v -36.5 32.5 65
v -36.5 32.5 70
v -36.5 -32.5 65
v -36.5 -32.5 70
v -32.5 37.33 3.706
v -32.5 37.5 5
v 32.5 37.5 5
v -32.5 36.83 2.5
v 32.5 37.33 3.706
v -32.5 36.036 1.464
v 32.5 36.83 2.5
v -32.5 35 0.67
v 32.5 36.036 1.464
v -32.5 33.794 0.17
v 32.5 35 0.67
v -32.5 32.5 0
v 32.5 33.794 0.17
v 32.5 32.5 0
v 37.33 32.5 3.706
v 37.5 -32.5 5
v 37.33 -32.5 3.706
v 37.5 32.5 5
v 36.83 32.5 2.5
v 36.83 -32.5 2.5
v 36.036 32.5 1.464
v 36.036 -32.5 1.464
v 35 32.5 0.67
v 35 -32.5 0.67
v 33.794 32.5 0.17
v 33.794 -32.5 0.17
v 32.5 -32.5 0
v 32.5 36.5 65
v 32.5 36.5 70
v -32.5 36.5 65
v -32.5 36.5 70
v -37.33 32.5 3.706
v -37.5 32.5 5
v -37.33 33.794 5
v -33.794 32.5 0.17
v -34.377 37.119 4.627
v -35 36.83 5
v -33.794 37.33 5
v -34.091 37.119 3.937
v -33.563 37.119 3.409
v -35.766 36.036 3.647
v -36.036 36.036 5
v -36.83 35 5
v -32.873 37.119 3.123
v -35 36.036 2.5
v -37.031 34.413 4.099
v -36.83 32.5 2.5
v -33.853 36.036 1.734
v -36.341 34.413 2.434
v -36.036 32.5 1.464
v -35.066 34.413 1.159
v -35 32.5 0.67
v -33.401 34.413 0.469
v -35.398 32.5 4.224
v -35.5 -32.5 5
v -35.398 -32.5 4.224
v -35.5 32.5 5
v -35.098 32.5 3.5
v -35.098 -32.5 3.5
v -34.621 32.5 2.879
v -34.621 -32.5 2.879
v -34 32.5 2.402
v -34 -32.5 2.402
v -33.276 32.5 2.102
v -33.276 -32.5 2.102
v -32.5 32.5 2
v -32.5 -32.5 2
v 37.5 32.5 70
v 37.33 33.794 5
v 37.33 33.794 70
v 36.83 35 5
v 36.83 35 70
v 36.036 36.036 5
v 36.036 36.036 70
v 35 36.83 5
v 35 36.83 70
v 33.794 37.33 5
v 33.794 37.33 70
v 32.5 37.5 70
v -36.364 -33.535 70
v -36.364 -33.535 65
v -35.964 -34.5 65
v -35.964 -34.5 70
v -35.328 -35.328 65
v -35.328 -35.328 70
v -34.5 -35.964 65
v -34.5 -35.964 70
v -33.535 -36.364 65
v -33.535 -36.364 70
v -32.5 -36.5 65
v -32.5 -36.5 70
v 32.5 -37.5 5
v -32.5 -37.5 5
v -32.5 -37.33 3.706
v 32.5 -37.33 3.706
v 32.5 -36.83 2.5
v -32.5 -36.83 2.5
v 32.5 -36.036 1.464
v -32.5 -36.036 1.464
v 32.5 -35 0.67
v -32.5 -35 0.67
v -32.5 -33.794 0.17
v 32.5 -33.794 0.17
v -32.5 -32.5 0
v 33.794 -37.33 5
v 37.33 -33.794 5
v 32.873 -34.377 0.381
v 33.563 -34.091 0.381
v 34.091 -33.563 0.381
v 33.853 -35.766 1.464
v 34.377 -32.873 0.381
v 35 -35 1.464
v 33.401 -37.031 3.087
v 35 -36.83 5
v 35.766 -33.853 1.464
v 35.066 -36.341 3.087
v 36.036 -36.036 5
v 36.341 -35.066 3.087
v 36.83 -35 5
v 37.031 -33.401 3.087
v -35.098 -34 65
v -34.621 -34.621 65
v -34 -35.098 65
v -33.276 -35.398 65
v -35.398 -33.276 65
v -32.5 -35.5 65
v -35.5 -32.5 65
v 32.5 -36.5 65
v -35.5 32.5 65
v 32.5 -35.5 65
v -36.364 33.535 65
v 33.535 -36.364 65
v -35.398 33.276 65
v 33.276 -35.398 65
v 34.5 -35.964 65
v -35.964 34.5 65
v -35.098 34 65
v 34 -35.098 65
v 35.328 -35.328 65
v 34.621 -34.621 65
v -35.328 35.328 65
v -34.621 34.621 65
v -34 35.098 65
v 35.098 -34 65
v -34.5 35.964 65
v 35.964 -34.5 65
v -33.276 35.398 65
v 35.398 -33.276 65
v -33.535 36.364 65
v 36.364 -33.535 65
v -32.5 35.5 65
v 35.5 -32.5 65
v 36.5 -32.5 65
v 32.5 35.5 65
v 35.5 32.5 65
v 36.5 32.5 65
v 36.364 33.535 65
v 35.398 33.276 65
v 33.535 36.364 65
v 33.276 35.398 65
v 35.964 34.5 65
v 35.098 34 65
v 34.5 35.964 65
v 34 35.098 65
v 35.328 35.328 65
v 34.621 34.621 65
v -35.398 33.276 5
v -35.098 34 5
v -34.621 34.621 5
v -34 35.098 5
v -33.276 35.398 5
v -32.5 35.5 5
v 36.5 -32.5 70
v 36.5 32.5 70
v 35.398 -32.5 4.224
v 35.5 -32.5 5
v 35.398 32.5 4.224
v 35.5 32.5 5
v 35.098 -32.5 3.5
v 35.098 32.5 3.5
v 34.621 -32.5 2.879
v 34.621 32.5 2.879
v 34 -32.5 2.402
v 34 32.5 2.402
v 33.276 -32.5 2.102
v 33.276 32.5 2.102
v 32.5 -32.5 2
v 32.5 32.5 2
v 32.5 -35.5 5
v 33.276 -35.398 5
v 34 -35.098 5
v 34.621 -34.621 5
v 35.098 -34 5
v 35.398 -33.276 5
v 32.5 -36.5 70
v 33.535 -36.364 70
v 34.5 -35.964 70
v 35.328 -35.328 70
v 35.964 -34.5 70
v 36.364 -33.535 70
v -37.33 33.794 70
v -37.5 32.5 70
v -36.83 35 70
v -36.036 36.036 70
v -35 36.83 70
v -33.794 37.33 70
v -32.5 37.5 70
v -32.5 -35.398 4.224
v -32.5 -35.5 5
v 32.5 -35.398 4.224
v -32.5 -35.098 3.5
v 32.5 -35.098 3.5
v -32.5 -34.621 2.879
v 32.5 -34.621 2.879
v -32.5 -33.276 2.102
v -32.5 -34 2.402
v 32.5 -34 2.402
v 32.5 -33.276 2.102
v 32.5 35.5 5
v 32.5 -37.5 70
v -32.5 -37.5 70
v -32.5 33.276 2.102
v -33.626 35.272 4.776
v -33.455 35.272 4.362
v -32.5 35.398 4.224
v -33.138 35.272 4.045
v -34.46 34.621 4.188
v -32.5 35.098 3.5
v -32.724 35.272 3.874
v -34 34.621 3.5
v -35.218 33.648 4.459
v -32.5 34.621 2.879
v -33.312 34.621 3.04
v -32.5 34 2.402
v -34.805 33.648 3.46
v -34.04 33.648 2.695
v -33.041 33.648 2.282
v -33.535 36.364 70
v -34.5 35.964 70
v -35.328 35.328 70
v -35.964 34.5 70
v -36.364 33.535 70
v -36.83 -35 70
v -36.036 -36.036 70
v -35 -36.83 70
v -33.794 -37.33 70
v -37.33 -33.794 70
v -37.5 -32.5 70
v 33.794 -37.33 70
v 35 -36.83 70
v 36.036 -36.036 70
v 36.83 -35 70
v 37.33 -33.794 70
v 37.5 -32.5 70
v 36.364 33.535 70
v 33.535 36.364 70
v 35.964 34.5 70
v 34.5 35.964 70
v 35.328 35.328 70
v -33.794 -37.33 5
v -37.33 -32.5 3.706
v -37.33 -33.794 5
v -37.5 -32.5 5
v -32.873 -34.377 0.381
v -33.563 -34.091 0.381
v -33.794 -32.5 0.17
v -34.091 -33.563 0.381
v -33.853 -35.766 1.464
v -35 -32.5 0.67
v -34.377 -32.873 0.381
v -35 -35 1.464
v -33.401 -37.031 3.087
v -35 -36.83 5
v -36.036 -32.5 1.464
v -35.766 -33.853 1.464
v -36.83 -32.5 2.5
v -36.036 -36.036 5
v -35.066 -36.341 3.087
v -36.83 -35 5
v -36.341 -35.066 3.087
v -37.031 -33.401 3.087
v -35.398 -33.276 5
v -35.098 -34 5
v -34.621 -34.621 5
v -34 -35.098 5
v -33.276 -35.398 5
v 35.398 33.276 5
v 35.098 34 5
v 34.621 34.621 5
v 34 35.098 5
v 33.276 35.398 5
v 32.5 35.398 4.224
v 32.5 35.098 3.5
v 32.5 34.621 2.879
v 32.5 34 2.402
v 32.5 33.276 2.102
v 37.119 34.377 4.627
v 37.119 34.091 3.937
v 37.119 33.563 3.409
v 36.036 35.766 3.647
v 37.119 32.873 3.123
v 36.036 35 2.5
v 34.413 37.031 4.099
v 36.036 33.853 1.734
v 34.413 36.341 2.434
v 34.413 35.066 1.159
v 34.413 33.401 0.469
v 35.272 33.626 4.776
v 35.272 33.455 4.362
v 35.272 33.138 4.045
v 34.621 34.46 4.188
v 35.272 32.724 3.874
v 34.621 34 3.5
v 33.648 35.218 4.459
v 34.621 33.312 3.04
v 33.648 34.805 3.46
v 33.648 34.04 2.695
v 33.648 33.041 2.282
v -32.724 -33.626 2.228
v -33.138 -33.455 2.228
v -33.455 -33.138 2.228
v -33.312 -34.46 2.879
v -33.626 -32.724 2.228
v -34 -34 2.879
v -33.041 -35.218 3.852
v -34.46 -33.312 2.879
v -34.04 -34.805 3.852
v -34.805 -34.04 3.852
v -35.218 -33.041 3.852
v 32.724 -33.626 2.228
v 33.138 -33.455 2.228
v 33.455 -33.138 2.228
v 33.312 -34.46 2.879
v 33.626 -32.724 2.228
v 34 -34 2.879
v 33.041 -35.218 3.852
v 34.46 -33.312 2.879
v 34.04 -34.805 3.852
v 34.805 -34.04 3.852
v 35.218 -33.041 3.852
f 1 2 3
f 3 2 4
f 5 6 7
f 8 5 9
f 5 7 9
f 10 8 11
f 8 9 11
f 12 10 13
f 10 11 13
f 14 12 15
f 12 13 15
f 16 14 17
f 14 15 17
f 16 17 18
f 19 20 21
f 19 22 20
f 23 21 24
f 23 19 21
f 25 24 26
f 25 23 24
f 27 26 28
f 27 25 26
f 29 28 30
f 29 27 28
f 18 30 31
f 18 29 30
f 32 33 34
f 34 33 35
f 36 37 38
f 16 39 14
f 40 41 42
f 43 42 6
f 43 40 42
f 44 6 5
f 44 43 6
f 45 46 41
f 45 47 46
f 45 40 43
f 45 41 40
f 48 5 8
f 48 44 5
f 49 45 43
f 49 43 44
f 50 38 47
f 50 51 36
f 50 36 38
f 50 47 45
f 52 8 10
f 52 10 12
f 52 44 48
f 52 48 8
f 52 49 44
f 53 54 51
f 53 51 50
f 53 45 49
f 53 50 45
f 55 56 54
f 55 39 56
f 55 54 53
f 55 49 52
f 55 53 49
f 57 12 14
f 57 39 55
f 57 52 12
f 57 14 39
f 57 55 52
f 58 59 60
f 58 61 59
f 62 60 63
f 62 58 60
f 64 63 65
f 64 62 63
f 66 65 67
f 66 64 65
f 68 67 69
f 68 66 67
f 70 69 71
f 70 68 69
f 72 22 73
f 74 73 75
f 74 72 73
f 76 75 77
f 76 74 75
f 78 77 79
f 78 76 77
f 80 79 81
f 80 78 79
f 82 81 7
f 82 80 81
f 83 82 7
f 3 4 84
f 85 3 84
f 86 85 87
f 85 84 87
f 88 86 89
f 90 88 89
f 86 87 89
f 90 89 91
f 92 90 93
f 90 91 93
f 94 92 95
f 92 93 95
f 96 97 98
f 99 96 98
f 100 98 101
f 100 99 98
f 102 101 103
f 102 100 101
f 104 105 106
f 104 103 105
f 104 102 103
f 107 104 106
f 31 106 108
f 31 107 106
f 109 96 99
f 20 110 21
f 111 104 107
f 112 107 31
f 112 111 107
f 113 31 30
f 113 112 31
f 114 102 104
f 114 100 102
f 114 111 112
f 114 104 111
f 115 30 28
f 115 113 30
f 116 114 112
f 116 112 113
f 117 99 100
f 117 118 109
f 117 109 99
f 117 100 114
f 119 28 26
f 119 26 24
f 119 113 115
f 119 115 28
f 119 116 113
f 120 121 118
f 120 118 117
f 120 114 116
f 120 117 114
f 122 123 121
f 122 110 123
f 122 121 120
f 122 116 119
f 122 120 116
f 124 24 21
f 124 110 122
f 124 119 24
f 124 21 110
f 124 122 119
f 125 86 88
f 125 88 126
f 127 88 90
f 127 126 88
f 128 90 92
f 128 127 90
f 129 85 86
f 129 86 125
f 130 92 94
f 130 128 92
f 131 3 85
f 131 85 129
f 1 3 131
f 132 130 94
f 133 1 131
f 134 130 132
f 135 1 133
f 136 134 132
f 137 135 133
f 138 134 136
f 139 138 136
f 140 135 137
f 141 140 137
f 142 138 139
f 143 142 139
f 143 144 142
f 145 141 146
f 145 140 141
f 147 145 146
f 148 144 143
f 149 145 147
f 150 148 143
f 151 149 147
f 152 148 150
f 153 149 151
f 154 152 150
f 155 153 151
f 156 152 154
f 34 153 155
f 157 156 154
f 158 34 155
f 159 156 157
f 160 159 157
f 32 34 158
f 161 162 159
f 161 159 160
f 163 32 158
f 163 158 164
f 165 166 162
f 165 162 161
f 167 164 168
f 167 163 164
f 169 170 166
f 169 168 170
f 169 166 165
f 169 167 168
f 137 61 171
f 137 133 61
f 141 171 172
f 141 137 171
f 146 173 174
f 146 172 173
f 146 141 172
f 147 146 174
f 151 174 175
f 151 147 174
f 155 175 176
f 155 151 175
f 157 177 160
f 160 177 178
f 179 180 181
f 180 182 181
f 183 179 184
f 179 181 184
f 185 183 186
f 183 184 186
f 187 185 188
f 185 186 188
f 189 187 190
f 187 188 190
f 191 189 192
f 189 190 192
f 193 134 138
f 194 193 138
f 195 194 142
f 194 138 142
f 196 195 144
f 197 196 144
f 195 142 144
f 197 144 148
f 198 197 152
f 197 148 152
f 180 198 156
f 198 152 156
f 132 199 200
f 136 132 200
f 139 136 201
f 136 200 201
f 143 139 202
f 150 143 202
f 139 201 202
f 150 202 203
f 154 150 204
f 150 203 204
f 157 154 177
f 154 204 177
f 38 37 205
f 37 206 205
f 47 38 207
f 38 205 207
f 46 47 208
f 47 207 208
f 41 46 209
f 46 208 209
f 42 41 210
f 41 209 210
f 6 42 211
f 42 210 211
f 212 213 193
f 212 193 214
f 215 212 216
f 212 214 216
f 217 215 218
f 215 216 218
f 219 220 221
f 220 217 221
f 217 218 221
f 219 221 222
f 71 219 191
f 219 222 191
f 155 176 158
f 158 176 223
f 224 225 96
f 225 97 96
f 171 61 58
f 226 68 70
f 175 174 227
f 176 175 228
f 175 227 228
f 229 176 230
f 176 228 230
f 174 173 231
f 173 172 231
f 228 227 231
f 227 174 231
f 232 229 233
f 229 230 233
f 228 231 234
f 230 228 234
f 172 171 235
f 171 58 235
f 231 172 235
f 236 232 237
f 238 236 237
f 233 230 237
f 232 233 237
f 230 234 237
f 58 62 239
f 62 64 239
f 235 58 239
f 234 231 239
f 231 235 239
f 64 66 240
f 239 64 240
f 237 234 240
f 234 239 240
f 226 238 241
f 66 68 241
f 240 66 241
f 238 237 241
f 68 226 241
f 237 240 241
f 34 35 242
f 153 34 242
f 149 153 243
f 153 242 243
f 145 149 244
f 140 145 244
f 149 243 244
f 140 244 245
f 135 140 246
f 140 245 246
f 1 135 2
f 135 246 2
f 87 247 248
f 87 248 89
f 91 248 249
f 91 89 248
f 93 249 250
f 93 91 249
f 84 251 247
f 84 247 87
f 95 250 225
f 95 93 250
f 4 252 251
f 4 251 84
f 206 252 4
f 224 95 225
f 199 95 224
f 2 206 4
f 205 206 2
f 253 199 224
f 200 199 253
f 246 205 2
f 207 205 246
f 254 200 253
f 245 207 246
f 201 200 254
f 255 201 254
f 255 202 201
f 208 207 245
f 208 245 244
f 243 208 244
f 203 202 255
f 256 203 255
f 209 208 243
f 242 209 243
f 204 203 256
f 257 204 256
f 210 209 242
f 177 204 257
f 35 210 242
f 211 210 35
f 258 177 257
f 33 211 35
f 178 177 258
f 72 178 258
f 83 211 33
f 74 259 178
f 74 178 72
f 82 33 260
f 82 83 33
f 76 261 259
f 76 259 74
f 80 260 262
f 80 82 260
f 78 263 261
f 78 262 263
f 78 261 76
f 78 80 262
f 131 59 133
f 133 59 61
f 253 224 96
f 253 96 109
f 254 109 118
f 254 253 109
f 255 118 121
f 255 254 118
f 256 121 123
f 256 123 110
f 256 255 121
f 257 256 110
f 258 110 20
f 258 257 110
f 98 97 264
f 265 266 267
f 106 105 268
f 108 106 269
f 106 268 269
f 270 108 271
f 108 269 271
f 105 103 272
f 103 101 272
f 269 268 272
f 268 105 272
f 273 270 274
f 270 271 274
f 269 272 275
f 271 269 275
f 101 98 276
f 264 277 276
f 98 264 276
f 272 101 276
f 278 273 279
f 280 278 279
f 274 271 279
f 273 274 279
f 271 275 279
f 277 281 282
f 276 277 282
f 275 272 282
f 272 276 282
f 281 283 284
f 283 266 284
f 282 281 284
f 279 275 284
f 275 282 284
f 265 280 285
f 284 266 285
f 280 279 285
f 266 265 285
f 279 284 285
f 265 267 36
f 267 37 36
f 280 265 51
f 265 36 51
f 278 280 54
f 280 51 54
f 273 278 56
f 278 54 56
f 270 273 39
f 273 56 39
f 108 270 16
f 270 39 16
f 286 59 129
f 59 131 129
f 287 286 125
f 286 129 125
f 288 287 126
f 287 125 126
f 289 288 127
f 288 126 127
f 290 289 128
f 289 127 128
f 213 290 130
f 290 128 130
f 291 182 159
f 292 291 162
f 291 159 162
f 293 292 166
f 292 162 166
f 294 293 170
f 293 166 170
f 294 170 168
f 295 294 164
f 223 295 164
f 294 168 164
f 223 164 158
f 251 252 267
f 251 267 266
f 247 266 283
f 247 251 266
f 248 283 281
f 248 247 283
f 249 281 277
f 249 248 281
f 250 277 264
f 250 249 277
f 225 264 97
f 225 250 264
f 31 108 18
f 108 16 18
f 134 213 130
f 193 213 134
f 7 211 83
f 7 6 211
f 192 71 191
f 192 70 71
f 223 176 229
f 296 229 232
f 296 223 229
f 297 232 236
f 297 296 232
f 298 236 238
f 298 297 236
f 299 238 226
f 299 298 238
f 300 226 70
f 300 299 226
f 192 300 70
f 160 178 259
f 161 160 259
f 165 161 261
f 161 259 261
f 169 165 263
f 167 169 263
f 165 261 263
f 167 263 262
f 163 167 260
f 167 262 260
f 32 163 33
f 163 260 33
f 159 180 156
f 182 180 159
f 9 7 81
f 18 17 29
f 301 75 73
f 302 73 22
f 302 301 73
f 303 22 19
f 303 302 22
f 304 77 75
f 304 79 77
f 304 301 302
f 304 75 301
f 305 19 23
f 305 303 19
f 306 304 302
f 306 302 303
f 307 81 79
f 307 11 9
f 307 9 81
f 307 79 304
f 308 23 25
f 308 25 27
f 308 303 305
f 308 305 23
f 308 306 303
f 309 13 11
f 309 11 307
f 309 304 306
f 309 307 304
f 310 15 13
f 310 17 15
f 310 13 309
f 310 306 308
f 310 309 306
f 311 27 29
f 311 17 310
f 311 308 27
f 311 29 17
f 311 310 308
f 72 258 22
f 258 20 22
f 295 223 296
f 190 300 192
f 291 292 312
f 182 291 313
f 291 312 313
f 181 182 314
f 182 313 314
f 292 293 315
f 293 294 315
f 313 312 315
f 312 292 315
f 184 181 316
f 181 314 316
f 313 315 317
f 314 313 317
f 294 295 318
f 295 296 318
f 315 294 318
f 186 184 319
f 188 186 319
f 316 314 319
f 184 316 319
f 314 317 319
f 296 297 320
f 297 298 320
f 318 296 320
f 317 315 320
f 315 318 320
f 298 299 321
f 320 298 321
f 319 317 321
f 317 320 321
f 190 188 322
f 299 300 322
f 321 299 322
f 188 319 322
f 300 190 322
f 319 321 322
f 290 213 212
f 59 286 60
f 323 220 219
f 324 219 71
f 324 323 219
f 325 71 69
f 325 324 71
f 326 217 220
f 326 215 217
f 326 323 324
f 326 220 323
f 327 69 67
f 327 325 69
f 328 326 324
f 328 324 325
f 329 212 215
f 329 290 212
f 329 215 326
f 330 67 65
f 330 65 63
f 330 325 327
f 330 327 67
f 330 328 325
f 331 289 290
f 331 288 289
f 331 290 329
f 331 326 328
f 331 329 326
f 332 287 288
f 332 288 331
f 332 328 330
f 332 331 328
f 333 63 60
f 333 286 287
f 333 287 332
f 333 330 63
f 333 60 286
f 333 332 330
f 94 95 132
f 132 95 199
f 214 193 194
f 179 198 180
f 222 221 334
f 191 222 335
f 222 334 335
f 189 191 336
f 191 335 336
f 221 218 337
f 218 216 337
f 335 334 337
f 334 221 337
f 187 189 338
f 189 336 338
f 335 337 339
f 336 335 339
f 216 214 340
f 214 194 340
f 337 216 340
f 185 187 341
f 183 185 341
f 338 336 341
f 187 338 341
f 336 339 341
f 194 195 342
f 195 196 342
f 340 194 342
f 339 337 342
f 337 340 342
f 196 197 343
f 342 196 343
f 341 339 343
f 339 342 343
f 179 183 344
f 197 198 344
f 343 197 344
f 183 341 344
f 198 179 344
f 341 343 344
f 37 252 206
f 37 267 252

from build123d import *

# Parameters (mm, degrees)
F0_W     = 75
F0_H     = 75
F0_W_2   = 71
F0_H_2   = 71
F1_DEPTH = 70
F2_R     = 5
F3_T     = -2
F6_DEPTH = 5


with BuildPart() as f1:
    # F0 (on Top) → F1 (new body)
    with BuildSketch(Plane.XY):
        Rectangle(F0_W, F0_H)
        Rectangle(F0_W_2, F0_H_2, mode=Mode.SUBTRACT)
        Rectangle(F0_W_2, F0_H_2)
    extrude(amount=F1_DEPTH)

    # F2
    f2_edges = [f1.edges().sort_by_distance(p)[0] for p in [
        (-37.5, -37.5, 35),
        (37.5, -37.5, 35),
        (0, -37.5, 0),
        (-37.5, 0, 0),
        (-37.5, 37.5, 35),
        (0, 37.5, 0),
        (37.5, 37.5, 35),
        (37.5, 0, 0),
    ]]
    fillet(f2_edges, radius=F2_R)

    # F3
    f3_openings = [f1.faces().sort_by_distance(p)[0] for p in [
        (0, 0, 70),
    ]]
    offset(amount=F3_T, openings=f3_openings)

    # F5 (on offset) → F6 (cut)
    with BuildSketch(Plane.XY.offset(70)):
        with BuildLine():
            Line((-36.5, 32.5), (-36.5, -32.5))
            ThreePointArc((-36.5, -32.5), (-35.3284271247, -35.3284271247), (-32.5, -36.5))
            Line((-32.5, -36.5), (32.5, -36.5))
            ThreePointArc((32.5, -36.5), (35.3284271247, -35.3284271247), (36.5, -32.5))
            Line((36.5, -32.5), (36.5, 32.5))
            ThreePointArc((36.5, 32.5), (35.3284271247, 35.3284271247), (32.5, 36.5))
            Line((32.5, 36.5), (-32.5, 36.5))
            ThreePointArc((-32.5, 36.5), (-35.3284271247, 35.3284271247), (-36.5, 32.5))
        make_face()
    extrude(amount=-F6_DEPTH, mode=Mode.SUBTRACT)


solid = f1.part
